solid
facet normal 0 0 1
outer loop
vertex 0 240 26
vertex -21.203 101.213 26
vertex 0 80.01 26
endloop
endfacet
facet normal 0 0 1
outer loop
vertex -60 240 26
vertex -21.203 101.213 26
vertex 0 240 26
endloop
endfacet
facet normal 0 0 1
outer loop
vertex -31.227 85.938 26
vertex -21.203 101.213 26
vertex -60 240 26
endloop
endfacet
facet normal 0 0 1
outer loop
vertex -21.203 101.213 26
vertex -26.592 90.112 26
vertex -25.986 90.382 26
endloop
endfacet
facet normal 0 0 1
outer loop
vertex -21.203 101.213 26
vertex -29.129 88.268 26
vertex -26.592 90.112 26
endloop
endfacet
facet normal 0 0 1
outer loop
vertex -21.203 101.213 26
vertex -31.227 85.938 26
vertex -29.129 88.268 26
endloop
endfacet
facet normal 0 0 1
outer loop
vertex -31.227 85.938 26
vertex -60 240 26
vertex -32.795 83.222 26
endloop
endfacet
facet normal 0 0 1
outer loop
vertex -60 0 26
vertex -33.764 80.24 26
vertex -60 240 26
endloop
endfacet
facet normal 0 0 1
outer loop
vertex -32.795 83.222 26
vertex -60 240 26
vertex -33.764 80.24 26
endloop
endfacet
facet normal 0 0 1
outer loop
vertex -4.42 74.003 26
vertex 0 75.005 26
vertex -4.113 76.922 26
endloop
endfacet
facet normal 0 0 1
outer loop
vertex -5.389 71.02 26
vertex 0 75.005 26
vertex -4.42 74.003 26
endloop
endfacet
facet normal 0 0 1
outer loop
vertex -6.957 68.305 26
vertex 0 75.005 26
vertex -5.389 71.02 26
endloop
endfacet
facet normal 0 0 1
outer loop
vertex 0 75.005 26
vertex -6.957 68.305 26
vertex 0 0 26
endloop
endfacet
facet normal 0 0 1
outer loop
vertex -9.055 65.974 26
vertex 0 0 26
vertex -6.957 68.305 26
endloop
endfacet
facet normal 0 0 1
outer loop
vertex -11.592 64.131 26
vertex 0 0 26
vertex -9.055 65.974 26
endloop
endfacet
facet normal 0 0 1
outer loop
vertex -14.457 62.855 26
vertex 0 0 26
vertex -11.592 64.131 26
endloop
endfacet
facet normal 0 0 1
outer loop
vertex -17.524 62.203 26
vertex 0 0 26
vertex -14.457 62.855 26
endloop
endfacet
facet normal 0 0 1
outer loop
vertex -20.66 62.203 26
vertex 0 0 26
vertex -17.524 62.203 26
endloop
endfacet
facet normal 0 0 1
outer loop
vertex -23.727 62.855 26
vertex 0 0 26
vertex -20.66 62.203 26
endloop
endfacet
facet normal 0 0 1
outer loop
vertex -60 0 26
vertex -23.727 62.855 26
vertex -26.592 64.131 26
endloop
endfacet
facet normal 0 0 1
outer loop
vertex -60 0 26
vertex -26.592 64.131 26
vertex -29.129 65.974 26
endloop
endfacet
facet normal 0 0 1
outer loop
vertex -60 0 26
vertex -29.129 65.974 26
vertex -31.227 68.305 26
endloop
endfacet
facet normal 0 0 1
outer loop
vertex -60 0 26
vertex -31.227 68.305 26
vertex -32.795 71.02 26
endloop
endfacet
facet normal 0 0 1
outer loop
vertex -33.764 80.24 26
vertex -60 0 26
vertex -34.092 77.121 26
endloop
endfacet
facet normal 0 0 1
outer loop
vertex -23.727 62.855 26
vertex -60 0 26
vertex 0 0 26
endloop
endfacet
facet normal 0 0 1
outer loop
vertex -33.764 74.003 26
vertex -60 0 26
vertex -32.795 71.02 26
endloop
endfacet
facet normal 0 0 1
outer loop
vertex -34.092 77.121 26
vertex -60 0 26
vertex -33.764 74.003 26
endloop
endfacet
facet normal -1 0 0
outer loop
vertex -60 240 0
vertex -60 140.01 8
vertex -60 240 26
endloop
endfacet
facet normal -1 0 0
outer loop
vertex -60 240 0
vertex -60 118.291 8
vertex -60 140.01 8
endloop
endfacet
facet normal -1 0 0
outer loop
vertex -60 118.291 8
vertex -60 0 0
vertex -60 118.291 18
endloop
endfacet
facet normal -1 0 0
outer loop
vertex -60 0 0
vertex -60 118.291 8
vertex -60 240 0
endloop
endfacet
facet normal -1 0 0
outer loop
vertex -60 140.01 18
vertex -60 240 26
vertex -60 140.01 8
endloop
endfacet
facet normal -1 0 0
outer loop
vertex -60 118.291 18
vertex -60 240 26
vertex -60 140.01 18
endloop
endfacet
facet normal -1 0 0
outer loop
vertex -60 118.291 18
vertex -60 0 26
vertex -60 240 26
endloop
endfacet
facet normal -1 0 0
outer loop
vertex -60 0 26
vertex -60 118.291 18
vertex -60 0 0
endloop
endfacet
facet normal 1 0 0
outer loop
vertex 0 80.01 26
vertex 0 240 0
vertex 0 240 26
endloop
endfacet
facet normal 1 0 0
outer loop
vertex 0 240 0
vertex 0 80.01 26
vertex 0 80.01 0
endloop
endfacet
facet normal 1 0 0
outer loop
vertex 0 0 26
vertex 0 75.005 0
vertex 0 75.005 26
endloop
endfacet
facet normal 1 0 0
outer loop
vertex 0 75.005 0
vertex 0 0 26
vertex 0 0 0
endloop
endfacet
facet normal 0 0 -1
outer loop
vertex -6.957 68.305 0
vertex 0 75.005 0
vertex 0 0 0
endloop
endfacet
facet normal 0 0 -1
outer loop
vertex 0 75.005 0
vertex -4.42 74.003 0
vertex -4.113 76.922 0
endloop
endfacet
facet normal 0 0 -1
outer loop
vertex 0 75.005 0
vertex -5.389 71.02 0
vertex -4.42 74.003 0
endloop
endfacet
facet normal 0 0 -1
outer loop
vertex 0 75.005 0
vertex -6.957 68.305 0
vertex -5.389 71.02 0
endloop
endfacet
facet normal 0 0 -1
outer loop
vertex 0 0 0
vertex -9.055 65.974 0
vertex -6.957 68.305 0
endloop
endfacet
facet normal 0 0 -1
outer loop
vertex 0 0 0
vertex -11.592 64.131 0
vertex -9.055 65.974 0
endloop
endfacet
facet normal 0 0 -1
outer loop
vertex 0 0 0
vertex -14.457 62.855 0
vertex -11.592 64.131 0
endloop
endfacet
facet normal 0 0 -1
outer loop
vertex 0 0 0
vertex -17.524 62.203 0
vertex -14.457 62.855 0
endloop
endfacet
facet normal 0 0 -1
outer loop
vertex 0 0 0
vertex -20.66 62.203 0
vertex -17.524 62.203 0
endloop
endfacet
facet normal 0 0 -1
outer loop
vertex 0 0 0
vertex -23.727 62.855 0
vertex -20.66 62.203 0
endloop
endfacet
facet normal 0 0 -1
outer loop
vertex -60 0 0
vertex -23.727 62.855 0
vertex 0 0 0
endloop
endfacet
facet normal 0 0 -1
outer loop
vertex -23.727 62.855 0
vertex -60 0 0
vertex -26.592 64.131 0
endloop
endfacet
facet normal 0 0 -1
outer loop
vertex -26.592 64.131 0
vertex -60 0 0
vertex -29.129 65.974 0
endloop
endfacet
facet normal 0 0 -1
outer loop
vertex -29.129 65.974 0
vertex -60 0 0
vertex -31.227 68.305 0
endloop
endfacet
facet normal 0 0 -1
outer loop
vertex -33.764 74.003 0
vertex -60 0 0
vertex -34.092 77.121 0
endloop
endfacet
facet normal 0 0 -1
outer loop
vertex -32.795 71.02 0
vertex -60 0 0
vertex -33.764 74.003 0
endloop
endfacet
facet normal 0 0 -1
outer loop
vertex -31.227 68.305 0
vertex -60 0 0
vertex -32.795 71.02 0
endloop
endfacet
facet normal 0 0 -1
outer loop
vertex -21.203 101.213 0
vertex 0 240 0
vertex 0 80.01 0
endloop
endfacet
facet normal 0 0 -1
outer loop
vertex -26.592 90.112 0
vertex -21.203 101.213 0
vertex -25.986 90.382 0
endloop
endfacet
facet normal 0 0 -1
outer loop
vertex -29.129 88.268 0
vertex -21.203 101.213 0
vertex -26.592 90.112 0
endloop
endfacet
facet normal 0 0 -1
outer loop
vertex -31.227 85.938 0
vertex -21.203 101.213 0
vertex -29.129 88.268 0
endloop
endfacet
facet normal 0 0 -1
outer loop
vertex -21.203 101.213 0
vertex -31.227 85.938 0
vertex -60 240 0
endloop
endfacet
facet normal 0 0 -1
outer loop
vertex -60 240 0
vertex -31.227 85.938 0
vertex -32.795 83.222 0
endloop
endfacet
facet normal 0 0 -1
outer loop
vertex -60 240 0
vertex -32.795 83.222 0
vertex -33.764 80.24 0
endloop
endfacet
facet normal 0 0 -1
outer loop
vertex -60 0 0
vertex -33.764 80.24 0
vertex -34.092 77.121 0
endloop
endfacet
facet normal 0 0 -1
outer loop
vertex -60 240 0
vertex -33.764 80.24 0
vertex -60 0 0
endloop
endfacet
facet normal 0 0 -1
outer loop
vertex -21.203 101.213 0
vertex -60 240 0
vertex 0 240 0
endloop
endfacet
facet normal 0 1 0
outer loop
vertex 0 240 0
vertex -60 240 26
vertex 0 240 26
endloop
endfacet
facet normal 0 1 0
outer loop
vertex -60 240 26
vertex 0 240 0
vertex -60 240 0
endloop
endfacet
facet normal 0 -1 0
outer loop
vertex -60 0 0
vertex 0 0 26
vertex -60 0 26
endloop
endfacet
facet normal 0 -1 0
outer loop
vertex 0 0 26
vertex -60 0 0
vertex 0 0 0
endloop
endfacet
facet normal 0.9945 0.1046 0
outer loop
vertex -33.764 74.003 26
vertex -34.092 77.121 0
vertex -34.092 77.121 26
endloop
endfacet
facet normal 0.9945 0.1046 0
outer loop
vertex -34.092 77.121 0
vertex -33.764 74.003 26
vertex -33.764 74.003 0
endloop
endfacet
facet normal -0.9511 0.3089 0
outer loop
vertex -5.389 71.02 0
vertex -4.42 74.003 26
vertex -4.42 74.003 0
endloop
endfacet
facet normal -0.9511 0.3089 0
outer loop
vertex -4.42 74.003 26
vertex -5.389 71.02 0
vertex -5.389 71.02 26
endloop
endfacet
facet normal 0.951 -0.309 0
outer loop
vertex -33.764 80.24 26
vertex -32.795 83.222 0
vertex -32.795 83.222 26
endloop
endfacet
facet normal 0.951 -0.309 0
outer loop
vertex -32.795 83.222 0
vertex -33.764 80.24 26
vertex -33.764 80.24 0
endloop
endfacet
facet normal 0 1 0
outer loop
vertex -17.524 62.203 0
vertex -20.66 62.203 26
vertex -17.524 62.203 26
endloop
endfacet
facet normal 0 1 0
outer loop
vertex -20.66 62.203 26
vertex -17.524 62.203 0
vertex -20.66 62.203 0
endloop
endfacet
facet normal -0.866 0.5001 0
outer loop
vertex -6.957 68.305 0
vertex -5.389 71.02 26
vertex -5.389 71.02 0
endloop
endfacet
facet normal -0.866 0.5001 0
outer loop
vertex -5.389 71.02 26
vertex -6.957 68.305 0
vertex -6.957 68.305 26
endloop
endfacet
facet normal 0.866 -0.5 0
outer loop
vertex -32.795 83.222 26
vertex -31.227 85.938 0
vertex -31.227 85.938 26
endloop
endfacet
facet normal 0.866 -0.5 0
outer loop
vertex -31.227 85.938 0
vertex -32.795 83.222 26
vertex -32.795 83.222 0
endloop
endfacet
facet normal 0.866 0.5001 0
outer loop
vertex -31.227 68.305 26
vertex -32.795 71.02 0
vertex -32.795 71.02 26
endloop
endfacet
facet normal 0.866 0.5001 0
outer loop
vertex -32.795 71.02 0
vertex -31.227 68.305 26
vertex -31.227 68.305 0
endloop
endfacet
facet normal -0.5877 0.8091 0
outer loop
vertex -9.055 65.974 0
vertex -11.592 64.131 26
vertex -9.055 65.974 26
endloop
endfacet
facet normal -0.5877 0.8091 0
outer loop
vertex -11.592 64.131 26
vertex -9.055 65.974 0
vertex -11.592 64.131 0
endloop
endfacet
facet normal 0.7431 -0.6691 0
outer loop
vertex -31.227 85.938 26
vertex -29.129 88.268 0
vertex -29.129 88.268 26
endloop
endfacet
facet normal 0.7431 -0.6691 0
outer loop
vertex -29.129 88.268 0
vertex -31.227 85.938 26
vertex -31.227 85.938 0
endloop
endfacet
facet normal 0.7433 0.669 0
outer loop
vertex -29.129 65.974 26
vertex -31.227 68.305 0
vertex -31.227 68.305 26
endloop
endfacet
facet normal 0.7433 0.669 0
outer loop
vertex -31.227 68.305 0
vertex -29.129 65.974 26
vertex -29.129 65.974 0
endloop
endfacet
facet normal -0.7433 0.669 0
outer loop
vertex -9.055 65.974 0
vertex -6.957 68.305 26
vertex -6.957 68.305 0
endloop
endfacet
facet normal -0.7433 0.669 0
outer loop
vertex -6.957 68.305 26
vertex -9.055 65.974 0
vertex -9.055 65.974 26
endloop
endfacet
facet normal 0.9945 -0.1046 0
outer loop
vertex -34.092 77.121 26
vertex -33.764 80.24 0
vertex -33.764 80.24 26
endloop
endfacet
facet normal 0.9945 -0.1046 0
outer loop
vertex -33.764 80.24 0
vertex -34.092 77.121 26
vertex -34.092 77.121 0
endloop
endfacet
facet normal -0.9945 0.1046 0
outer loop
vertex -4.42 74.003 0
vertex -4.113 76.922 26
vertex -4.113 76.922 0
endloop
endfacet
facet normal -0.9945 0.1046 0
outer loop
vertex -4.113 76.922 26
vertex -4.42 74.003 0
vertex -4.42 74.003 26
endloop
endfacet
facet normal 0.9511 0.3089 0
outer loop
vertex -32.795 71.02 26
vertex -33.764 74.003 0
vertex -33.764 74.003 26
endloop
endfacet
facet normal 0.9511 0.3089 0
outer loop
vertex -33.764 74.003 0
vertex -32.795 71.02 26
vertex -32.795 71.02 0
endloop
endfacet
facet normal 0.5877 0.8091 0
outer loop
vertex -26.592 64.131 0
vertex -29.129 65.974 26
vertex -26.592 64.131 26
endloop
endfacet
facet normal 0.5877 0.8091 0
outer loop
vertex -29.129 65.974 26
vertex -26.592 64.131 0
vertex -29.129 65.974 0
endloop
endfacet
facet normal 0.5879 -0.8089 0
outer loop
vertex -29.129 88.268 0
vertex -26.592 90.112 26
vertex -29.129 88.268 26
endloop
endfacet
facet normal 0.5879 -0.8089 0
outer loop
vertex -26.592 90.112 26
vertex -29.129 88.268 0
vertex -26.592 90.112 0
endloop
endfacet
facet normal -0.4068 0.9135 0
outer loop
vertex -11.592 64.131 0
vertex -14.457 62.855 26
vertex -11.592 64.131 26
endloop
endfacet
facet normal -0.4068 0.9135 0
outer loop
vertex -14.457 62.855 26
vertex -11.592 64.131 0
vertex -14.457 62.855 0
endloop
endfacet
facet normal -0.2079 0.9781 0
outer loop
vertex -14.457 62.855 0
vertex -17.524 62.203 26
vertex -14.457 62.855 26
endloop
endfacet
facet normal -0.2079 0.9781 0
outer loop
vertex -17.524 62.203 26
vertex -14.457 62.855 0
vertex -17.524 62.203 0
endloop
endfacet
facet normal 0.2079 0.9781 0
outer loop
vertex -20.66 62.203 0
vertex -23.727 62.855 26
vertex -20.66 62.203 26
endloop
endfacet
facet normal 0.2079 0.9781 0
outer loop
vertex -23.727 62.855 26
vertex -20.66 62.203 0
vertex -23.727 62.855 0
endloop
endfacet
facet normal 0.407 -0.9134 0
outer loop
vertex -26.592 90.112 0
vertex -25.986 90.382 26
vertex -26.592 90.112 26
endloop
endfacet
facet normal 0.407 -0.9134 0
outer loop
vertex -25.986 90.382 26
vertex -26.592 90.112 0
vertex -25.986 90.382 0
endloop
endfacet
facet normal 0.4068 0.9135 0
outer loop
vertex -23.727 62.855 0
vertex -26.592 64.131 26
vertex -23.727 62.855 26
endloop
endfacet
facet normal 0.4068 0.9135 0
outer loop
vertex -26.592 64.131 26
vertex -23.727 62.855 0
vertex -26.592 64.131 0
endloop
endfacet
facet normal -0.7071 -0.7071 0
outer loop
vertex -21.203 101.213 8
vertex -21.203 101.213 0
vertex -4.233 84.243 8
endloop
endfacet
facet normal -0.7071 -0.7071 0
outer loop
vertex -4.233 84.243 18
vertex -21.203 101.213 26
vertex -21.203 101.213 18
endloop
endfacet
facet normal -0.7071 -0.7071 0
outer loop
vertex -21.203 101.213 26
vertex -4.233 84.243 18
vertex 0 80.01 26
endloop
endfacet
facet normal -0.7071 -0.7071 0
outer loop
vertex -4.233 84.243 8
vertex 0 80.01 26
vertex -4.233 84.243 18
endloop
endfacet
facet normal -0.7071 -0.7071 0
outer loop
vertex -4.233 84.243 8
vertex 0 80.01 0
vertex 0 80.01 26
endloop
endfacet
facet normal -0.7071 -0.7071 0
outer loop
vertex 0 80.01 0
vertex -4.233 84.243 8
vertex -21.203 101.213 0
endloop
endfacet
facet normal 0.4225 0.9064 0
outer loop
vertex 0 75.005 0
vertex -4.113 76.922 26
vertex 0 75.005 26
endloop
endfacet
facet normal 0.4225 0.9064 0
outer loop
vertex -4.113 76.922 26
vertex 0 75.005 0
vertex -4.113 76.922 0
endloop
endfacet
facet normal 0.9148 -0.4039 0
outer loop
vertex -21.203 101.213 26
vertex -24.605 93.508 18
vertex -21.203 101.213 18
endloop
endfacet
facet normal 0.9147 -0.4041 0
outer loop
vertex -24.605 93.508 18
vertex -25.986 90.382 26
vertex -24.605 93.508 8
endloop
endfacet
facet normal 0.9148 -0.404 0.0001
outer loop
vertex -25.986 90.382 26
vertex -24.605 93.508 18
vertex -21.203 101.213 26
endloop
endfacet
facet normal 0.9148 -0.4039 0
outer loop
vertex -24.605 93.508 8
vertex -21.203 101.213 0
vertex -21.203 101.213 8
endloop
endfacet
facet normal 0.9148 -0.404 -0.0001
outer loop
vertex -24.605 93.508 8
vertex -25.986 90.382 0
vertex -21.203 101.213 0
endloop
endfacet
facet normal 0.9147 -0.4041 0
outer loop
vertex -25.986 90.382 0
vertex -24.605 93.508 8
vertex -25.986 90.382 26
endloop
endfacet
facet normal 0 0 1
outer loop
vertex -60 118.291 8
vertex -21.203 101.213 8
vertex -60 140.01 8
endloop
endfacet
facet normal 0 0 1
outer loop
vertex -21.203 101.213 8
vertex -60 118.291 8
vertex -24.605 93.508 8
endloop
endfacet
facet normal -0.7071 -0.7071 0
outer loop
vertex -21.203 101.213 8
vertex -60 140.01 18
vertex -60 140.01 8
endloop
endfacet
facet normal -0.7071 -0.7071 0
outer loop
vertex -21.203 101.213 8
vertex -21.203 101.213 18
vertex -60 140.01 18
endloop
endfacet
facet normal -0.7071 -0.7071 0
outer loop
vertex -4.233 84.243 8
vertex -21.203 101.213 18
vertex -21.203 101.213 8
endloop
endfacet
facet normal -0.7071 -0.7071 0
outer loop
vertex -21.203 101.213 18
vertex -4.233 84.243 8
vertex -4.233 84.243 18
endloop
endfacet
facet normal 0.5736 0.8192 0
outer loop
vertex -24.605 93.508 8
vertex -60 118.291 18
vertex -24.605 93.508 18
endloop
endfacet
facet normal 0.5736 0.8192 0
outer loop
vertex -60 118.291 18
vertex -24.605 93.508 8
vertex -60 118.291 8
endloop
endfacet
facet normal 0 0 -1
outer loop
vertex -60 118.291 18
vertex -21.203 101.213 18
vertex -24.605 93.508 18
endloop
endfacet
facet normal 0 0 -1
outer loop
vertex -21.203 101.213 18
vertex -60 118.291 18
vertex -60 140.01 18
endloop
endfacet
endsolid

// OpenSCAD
overall_length = 240;
overall_width = 26;
overall_height = 60;
through_slot_length = 30;
ejection_hole_diameter = 30;
ejection_mouth_width = 5;
iron_position = 75;
iron_bed_angle = 45;
iron_clearance_angle = 20;
iron_narrow_width = 10;
iron_wide_length = 38;
iron_thickness = 3;
epsilon = 0.01;
wedge_angle = 10;
wedge_opening = 5;
wedge_length = 90;
wedge_width = iron_narrow_width * 0.8;
wedge_knob_radius = 11.7;
// 0.0 means the wedge is meant to go all the way to the bottom of the
// plane. 1.0 means that it stops at th etop of the ejection hole.
wedge_protrusion = 0.2; 

module wedge_poly(opening, theta1, theta2, length) {
  polygon([[0, 0],
           [opening,0],
           [length*cos(theta1)+opening, length*sin(theta1)],
           [length*cos(theta2), length*sin(theta2)]]);
}

module wedge_position() {
    translate([0, cos(iron_bed_angle)*through_slot_length*wedge_protrusion, sin(iron_bed_angle)*through_slot_length*wedge_protrusion]) {
      translate([overall_width/2-iron_narrow_width/2,iron_position,-epsilon]) {
        rotate([90,0,0]) {
          rotate([0,90,0]) {
            children();
          }
        }
      }
    }
}

module plane_body() {
  difference() {
    // Plane body
    cube([overall_width,overall_length,overall_height]);
    // Ejection hole
    translate([0, cos(iron_bed_angle+90)*ejection_hole_diameter/2.5, sin(iron_bed_angle+90)*ejection_hole_diameter/2.5]) {
      translate([0, cos(iron_bed_angle)*through_slot_length/2, sin(iron_bed_angle)*through_slot_length/2]) {
        translate([-epsilon,iron_position,0]) {
          rotate([0,90,0]) {
            cylinder(r1=ejection_hole_diameter/2,r2=ejection_hole_diameter/2,h=overall_width+2*epsilon);
          }
        }
      }
    }
    // Iron bed slot
    translate([-epsilon,iron_position,-epsilon]) {
      rotate([90,0,0]) {
        rotate([0,90,0]) {
          linear_extrude(height=overall_width+2*epsilon) {
            wedge_poly(ejection_mouth_width,iron_bed_angle,iron_bed_angle+iron_clearance_angle,through_slot_length);
          }
        }
      }
    }
    // Wedge hole
    wedge_position() {
      linear_extrude(height=iron_narrow_width) {
        wedge_poly(wedge_opening, iron_bed_angle, iron_bed_angle+wedge_angle, wedge_length);
      }
    }
  }
}

module wedge() {
  union() {
    translate([wedge_length*cos(iron_bed_angle+wedge_angle/2),wedge_length*sin(iron_bed_angle+wedge_angle/2)]) {
      // TODO: Make diameter parametric
      cylinder(h=wedge_width,r=wedge_knob_radius);
    }
    linear_extrude(height=wedge_width) {
      wedge_poly(wedge_opening, iron_bed_angle, iron_bed_angle+wedge_angle, wedge_length);
    }
  }
}

module both() {
  color([0.5,0.3,0,1]) plane_body();
  wedge_position() {
    color([1,0,0,1]) wedge();
  }
}

rotate([0,-90,0]) plane_body();
//translate([25,0,0]) rotate([0,0,iron_bed_angle]) wedge();
